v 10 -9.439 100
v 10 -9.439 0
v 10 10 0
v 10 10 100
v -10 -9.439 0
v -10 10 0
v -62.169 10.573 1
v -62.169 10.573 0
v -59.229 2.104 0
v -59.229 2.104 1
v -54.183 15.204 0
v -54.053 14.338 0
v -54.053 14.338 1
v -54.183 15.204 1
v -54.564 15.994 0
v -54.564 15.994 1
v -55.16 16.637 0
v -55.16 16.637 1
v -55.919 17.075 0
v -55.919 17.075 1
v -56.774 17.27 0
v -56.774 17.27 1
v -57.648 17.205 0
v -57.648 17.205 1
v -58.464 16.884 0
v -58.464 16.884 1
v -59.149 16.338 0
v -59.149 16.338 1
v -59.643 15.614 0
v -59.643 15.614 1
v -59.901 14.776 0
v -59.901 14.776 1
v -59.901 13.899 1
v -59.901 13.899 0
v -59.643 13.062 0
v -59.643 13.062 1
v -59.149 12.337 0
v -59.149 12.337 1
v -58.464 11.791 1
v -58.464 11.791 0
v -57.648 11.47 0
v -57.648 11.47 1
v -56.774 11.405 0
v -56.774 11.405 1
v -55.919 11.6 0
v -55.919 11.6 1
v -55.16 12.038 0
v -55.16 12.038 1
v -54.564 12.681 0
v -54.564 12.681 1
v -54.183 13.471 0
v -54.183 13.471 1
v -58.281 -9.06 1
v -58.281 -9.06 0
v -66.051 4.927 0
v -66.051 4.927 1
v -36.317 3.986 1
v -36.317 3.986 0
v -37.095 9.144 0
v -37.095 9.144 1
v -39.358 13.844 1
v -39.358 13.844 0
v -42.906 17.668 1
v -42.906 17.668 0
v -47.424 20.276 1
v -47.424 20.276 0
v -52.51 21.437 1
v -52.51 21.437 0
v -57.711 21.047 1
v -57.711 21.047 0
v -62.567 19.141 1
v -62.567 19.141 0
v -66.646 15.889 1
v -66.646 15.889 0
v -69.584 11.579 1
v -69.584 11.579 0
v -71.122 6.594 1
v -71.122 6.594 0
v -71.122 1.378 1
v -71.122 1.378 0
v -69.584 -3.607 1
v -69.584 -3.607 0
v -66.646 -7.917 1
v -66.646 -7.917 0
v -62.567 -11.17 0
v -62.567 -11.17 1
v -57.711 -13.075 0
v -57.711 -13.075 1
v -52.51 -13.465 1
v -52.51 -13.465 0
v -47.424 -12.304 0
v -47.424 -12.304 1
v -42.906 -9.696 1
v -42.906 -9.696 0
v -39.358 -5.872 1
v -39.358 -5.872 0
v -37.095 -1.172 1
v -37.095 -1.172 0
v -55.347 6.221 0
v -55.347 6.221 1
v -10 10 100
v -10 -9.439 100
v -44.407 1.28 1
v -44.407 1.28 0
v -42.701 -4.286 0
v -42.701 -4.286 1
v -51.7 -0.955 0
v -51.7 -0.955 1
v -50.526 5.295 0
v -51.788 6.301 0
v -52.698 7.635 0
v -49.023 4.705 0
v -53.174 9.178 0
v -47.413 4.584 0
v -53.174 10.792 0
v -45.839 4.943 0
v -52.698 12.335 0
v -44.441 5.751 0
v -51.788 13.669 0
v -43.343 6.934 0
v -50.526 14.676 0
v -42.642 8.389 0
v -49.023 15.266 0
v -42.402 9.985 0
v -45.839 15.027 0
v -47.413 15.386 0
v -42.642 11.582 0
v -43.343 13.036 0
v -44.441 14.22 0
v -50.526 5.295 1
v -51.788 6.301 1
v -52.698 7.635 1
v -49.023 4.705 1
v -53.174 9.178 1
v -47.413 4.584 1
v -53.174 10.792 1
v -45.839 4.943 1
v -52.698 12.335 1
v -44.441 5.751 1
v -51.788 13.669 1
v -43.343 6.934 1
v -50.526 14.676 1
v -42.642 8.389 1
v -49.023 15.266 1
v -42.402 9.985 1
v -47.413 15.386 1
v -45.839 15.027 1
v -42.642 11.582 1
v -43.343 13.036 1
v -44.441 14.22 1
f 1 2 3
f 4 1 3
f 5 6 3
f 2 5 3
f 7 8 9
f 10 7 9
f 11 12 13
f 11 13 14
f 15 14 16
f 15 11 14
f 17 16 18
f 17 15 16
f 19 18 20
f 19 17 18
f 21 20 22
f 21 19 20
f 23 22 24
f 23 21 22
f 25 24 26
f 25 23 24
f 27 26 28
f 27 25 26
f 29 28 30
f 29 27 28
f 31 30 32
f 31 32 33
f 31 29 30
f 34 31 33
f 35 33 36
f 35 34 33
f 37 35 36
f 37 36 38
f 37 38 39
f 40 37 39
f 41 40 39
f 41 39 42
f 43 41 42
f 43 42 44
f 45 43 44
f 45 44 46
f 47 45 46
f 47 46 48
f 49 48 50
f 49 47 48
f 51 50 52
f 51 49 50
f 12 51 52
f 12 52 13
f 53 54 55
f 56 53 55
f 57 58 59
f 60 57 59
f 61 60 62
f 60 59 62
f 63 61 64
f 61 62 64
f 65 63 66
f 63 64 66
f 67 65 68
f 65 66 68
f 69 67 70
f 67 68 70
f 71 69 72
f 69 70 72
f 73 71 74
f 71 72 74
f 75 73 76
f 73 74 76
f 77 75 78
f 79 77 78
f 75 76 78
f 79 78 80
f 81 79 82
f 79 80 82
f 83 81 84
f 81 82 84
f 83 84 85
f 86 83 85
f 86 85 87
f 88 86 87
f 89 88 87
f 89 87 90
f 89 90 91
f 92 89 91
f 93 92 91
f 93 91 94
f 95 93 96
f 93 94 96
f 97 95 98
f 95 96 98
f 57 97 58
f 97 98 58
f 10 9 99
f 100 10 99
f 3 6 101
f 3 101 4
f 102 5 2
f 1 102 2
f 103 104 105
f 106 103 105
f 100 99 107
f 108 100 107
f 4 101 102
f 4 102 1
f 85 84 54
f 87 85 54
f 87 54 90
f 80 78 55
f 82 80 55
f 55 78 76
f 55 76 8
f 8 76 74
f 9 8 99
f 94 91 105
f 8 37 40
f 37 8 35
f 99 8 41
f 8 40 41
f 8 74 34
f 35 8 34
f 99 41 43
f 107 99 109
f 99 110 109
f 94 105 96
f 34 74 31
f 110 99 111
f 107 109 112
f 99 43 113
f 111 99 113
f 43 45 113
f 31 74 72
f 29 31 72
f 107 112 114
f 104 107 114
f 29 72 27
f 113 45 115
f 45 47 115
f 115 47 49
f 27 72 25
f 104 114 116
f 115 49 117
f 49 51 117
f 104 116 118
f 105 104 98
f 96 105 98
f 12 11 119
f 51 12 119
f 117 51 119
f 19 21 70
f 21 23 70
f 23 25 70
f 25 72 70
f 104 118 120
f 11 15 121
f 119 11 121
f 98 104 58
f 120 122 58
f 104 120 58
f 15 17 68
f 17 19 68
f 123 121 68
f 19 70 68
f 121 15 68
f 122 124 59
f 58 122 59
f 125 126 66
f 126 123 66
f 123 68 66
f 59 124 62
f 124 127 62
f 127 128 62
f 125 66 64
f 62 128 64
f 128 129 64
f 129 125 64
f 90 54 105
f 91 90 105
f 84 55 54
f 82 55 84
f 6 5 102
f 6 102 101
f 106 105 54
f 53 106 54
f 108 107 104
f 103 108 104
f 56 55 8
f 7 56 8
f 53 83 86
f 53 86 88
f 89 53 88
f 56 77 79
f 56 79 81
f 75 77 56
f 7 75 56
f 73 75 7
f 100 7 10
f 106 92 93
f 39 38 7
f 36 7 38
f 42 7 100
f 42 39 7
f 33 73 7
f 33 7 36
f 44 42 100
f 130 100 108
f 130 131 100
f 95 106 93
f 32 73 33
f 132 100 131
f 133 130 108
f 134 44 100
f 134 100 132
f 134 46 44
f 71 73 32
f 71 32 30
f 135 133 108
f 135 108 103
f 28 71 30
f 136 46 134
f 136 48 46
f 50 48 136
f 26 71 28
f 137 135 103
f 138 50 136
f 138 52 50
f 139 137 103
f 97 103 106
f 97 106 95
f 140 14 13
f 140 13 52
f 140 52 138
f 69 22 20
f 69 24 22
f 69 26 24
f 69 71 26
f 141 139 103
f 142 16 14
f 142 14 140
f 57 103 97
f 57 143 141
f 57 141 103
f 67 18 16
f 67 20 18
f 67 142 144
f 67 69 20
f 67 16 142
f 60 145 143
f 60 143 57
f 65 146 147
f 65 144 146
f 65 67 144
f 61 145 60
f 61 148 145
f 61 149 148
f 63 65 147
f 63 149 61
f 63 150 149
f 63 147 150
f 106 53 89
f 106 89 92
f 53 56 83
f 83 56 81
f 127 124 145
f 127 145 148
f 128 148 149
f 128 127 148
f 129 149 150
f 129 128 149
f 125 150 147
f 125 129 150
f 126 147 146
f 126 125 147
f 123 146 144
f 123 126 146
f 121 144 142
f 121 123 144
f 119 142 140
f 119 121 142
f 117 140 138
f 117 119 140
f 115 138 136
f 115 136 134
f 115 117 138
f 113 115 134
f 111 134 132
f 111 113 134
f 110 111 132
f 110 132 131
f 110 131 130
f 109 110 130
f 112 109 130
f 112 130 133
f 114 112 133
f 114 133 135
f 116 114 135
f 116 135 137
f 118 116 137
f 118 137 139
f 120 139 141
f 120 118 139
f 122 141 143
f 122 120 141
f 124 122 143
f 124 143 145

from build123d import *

# Parameters (mm, degrees)
F0_W     = 19.9999965323
F0_H     = 19.4392482125
F0_W_2   = 18.7999965323
F0_H_2   = 18.2392482125
F1_DEPTH = 100
F0_R     = 17.5
F0_R_2   = 5.4162553958
F0_R_3   = 2.9408408329
F2_DEPTH = 1


with BuildPart() as f1:
    # F0 (on Top) → F1 (new body)
    with BuildSketch(Plane.XY):
        with Locations((1.7338e-06, 0.2803758938)):
            Rectangle(F0_W, F0_H)
        with Locations((1.7338e-06, 0.2803758938)):
            Rectangle(F0_W_2, F0_H_2, mode=Mode.SUBTRACT)
        with Locations((1.7338e-06, 0.2803758938)):
            Rectangle(F0_W_2, F0_H_2)
    extrude(amount=F1_DEPTH)


with BuildPart() as f2:
    # F0 (on Top) → F2 (new body)
    with BuildSketch(Plane.XY):
        with Locations((-53.8173690438, 3.9858361706)):
            Circle(F0_R)
        Polygon((-58.2814313382, -9.0601613548), (-66.0512670875, 4.926905036), (-62.169354409, 10.5733172968), (-59.2285133898, 2.1036986727), (-55.3466044366, 6.2208748423), (-51.6999661922, -0.9547745576), (-44.4066822529, 1.2802636484), (-42.7010375303, -4.2855254412), align=None, mode=Mode.SUBTRACT)
        with Locations((-47.8180535138, 9.9851489067)):
            Circle(F0_R_2, mode=Mode.SUBTRACT)
        with Locations((-56.9934770465, 14.3375927582)):
            Circle(F0_R_3, mode=Mode.SUBTRACT)
    extrude(amount=F2_DEPTH)


solid = Compound([f1.part, f2.part])
